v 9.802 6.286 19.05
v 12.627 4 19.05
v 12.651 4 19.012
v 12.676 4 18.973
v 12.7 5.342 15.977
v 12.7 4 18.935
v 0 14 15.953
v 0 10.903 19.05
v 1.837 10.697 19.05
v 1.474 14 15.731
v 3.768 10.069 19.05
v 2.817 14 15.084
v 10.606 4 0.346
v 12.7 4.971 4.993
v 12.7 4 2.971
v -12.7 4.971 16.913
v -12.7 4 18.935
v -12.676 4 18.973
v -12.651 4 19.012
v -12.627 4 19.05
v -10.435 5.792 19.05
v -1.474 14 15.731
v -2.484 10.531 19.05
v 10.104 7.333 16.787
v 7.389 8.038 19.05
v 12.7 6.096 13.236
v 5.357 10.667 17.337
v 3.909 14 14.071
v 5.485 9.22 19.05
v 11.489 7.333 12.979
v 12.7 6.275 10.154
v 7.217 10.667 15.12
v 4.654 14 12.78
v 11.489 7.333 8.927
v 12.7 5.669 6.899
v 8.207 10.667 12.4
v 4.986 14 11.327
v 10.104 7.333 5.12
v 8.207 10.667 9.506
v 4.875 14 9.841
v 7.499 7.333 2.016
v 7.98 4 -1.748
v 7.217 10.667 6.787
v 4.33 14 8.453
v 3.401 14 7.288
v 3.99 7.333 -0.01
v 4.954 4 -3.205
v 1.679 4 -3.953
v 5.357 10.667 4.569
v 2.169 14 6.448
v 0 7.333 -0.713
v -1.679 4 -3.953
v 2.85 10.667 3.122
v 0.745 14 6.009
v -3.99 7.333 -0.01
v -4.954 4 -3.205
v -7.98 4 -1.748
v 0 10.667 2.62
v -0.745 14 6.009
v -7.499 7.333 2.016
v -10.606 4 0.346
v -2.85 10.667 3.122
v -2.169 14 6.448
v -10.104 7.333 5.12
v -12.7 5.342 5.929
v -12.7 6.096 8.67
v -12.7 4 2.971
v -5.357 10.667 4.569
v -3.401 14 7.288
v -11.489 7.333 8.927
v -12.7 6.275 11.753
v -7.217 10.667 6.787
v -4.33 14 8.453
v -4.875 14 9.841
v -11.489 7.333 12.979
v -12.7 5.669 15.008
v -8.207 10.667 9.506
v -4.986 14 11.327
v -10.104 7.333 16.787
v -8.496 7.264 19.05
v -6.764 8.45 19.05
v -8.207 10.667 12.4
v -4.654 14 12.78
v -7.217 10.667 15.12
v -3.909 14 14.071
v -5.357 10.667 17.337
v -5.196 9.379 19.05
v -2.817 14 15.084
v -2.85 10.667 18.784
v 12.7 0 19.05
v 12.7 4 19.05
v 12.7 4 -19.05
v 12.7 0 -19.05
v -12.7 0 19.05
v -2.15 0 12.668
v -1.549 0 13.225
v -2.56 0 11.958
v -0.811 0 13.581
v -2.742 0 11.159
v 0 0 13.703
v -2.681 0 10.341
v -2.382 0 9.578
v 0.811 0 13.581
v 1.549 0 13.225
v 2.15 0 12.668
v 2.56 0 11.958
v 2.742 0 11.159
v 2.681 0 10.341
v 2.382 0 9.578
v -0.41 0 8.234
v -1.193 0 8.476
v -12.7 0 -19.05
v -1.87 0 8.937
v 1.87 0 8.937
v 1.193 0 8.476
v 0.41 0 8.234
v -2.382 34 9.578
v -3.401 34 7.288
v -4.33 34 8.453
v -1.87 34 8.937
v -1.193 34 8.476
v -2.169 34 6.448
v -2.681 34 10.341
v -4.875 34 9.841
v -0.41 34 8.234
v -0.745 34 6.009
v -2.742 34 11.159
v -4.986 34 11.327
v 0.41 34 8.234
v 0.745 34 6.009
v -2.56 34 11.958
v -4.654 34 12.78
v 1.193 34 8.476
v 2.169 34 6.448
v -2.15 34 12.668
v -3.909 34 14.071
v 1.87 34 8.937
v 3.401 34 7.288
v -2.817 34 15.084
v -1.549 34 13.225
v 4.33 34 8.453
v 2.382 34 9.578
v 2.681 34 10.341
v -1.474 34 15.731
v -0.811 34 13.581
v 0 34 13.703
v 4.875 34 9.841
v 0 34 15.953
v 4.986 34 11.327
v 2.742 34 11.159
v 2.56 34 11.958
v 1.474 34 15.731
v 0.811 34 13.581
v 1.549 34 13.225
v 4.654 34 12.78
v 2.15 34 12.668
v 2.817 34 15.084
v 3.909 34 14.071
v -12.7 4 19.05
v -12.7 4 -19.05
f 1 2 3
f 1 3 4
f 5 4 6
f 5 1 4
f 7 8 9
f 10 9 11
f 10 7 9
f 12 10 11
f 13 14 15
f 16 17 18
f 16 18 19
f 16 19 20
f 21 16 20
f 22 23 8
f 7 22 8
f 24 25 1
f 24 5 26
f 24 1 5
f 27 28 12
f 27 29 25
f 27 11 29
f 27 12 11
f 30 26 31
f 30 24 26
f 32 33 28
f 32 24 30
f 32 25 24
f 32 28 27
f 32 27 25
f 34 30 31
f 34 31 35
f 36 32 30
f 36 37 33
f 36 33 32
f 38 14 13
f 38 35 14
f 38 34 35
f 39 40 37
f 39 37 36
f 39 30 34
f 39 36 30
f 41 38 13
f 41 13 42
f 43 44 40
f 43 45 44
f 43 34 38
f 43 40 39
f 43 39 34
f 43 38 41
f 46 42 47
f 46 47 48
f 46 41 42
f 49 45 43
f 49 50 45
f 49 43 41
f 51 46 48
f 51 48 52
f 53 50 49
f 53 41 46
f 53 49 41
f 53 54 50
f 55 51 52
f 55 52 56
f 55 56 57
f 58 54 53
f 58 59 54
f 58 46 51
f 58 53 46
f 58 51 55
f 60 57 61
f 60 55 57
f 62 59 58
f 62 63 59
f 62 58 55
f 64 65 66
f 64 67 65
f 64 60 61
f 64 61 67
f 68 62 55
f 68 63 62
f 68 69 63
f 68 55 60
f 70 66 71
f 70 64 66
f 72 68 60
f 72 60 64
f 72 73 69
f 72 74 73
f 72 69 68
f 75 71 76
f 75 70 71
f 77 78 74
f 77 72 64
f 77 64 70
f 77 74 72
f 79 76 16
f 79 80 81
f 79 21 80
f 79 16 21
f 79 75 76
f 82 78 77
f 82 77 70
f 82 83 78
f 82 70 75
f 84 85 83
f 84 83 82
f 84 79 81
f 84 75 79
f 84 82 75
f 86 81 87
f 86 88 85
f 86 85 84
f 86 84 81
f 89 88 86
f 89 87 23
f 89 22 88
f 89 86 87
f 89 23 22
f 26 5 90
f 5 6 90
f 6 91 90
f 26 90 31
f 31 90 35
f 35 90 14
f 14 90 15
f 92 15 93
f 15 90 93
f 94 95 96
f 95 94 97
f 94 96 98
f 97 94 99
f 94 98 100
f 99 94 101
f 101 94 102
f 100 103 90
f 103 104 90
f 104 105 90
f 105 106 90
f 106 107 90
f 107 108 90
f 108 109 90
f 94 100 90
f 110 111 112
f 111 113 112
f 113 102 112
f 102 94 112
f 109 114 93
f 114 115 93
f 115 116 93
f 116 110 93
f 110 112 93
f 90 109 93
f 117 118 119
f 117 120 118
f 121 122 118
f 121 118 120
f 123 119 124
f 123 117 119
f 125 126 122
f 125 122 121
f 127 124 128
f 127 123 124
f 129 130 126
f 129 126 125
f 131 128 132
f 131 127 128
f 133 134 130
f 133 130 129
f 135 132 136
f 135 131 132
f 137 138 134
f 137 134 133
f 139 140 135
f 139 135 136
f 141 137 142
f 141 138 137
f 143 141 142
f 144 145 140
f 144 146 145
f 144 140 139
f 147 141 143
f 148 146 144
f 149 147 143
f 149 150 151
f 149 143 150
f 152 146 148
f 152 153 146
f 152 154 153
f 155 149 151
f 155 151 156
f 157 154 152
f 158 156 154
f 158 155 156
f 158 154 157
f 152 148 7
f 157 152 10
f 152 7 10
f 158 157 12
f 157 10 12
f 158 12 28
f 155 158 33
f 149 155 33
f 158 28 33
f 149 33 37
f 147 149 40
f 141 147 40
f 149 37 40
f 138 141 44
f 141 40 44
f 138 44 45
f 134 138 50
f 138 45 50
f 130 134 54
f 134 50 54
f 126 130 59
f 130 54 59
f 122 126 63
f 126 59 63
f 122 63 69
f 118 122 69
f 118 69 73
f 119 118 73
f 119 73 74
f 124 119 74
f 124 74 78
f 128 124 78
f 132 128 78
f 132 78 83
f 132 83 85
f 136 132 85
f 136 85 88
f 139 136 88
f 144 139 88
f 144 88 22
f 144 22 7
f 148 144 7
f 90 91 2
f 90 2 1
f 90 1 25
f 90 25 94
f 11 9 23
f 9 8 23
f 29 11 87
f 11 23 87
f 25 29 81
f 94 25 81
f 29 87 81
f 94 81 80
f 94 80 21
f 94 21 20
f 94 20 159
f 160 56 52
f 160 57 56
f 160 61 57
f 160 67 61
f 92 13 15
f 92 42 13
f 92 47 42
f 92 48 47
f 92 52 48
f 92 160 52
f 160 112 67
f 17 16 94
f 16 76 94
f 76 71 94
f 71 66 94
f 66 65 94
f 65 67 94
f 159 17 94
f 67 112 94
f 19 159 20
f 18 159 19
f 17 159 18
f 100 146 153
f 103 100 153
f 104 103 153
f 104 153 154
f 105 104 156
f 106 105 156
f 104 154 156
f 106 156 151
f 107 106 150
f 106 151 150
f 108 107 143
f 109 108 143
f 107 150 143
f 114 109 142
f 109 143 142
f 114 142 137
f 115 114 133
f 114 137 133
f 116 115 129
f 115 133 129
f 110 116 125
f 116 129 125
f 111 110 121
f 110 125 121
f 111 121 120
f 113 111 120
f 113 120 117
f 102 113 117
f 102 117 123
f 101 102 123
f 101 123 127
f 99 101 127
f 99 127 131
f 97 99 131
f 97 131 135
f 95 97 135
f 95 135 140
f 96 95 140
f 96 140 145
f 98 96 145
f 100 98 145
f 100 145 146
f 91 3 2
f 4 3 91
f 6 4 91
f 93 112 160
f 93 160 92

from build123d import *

# Parameters (mm, degrees)
SKETCH1_W           = 25.4
SKETCH1_H           = 38.1
BOSS_EXTRUDE1_DEPTH = 4
SKETCH2_R           = 5
BOSS_EXTRUDE2_DEPTH = 30
SKETCH3_R           = 2.75
CUT_EXTRUDE1_DEPTH  = 40
CHAMFER1_SIZE       = 10


with BuildPart() as part:
    # Sketch1 → Boss-Extrude1 (new body)
    with BuildSketch(Plane(origin=(0, 0, 0), x_dir=(1, 0, 0), z_dir=(0, 1, 0))):
        Rectangle(SKETCH1_W, SKETCH1_H)
    extrude(amount=BOSS_EXTRUDE1_DEPTH)

    # Sketch2 → Boss-Extrude2 (add)
    with BuildSketch(Plane(origin=(0, 4, 0), x_dir=(1, 0, 0), z_dir=(0, 1, 0))):
        with Locations(Location((0, -10.9531854, 0), (0, 0, 270))):
            Circle(SKETCH2_R)
    extrude(amount=BOSS_EXTRUDE2_DEPTH)

    # Sketch3 → Cut-Extrude1 (cut)
    with BuildSketch(Plane(origin=(0, 34, 0), x_dir=(1, 0, 0), z_dir=(0, 1, 0))):
        with Locations(Location((0, -10.9531854, 0), (0, 0, 270))):
            Circle(SKETCH3_R)
    extrude(amount=-CUT_EXTRUDE1_DEPTH, mode=Mode.SUBTRACT)

    # Chamfer1
    # the kernel refuses this chamfer: 10 mm, written as the material it adds along each edge
    with BuildSketch(Plane(origin=(0, 4, 10.9531854), x_dir=(0, 0, 1), z_dir=(-1, 0, 0))) as chamfer1_piece_1_section:
        Polygon((5 + CHAMFER1_SIZE, 0), (5, CHAMFER1_SIZE), (5, 0), align=None)
    chamfer1_piece_1 = revolve(axis=Axis((0, 4, 10.9531854), (0, 1, 0)), mode=Mode.PRIVATE)
    chamfer1_piece_1 = split(chamfer1_piece_1, bisect_by=Plane(origin=(-12.7, 8.904804992, 1.048380408), z_dir=(1, 0, 0)), keep=Keep.TOP, mode=Mode.PRIVATE)
    chamfer1_piece_1 = split(chamfer1_piece_1, bisect_by=Plane(origin=(12.7, 8.904804992, 1.048380408), z_dir=(-1, 0, 0)), keep=Keep.TOP, mode=Mode.PRIVATE)
    chamfer1_piece_1 = split(chamfer1_piece_1, bisect_by=Plane(origin=(0, 8.904804992, 19.05), z_dir=(0, 0, -1)), keep=Keep.TOP, mode=Mode.PRIVATE)
    add(chamfer1_piece_1)


solid = part.part
